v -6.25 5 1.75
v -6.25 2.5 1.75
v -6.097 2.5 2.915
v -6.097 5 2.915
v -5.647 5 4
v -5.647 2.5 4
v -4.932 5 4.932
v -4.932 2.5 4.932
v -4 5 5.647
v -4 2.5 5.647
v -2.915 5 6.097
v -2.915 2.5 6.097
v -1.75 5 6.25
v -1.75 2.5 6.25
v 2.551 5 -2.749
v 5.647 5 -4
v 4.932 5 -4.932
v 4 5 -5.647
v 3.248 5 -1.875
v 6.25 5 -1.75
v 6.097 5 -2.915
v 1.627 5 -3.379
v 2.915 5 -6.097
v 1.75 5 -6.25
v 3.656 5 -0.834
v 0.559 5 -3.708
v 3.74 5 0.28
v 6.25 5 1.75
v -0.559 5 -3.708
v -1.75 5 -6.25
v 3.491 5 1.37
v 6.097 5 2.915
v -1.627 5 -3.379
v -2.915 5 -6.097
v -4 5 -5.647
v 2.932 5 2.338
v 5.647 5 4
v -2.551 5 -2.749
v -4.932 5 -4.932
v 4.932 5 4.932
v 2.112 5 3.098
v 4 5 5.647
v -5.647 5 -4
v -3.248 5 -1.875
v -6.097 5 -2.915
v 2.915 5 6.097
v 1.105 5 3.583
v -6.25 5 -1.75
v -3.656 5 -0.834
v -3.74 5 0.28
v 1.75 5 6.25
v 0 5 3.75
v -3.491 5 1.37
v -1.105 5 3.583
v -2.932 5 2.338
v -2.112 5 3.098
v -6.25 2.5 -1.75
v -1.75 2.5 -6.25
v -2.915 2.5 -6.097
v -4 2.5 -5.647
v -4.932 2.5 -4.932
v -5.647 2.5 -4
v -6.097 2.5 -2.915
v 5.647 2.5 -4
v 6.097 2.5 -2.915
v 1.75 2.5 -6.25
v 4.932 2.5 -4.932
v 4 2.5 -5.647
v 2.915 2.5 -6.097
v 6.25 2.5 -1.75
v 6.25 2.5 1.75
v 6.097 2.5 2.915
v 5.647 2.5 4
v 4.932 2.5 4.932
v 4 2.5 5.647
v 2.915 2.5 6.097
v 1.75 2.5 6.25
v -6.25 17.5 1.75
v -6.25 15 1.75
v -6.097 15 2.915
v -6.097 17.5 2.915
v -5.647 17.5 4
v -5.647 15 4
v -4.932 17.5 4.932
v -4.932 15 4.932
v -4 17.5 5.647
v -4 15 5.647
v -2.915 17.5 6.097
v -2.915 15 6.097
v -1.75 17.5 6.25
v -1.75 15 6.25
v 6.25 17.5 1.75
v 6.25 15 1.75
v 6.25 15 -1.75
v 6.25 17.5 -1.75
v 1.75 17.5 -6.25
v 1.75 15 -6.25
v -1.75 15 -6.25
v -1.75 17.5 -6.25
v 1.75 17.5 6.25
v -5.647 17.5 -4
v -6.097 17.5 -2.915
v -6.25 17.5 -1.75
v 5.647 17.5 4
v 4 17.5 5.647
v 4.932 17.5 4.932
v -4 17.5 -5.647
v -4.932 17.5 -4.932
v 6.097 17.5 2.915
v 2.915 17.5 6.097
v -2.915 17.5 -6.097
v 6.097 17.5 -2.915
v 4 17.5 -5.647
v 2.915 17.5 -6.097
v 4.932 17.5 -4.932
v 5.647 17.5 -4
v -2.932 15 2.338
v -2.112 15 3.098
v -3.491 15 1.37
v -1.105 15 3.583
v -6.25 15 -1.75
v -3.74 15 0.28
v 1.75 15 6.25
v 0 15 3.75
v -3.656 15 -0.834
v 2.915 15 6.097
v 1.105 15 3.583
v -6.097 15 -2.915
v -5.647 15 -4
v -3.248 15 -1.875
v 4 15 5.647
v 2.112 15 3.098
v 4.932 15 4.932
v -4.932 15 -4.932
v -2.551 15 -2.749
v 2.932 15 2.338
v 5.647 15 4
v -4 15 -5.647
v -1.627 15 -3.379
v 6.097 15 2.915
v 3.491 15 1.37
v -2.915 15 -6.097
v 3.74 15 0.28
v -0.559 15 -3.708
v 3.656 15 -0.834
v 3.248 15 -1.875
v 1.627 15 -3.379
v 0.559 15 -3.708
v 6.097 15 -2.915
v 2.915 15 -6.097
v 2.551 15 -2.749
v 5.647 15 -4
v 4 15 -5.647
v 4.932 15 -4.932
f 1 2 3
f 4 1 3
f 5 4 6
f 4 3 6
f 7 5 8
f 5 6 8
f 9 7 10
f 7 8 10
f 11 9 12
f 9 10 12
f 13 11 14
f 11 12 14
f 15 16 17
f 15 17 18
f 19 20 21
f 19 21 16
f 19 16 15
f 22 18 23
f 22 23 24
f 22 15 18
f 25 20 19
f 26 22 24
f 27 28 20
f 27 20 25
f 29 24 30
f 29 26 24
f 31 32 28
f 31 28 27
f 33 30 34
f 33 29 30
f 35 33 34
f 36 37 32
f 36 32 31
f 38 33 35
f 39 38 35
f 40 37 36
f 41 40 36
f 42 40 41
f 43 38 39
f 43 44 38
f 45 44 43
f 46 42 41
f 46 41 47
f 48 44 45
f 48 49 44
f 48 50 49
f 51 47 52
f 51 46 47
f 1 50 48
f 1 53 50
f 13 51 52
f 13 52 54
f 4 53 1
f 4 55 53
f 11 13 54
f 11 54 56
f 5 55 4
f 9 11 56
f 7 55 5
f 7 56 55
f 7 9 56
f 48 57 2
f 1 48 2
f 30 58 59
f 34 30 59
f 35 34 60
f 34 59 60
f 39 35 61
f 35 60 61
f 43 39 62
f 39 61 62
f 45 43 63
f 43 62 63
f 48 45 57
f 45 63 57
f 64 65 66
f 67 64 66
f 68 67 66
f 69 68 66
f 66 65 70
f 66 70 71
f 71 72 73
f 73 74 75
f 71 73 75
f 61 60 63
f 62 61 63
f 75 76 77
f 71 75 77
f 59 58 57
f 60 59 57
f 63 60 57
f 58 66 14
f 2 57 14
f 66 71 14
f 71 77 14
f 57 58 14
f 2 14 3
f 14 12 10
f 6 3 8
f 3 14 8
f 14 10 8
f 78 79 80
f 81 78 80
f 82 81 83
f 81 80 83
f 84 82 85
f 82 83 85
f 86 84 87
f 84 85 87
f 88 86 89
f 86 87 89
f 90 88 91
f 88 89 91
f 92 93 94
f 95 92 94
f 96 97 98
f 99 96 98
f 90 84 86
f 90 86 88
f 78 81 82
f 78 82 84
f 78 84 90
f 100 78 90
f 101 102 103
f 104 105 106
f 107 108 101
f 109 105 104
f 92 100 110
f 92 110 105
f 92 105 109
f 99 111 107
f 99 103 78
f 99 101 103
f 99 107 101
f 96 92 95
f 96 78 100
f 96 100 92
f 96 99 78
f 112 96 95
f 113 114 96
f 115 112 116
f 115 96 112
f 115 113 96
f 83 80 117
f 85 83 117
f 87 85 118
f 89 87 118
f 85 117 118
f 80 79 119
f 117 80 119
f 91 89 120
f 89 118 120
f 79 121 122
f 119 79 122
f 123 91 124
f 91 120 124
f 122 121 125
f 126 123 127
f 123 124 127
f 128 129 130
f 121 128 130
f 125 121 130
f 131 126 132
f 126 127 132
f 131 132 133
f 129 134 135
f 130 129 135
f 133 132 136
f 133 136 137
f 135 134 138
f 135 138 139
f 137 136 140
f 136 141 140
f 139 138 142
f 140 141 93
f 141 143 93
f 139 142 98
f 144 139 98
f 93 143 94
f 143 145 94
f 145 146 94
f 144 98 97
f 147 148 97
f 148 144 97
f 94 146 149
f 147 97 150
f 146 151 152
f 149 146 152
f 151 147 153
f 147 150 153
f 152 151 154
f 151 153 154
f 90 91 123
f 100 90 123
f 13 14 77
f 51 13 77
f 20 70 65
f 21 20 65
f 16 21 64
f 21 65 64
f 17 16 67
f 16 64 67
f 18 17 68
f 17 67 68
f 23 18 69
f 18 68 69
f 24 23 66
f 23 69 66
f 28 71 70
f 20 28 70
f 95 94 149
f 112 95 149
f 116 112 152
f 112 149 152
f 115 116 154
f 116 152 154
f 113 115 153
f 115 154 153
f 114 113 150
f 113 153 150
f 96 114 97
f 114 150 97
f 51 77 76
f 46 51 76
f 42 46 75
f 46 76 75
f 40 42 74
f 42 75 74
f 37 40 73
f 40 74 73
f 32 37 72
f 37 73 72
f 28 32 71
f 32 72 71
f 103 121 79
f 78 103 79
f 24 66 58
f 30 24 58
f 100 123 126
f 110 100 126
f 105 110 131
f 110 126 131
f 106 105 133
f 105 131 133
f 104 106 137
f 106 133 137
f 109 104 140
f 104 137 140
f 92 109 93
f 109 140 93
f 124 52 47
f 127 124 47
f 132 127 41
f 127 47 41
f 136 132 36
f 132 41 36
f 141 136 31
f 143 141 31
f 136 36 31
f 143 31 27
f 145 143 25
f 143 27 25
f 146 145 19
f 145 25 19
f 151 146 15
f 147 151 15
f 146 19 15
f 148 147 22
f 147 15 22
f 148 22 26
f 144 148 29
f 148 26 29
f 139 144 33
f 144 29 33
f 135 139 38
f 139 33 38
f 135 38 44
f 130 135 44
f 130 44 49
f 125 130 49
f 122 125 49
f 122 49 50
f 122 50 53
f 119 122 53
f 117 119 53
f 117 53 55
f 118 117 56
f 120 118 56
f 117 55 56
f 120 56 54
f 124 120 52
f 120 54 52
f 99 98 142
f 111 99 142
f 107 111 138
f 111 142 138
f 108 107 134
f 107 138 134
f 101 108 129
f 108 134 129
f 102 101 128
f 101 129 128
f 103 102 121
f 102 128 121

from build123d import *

# Parameters (mm, degrees)
SKETCH1_R           = 7.5
BOSS_EXTRUDE1_DEPTH = 20
BOSS_EXTRUDE2_DEPTH = 5
BOSS_EXTRUDE4_START = 5
BOSS_EXTRUDE4_DEPTH = 5
SCALE1_SCALE        = 0.5


with BuildPart() as part:
    # Sketch1 → Boss-Extrude1 (new body)
    with BuildSketch(Plane(origin=(0, 0, 0), x_dir=(1, 0, 0), z_dir=(0, 1, 0))):
        with Locations(Location((0, 0, 0), (0, 0, 270))):
            Circle(SKETCH1_R)
    extrude(amount=BOSS_EXTRUDE1_DEPTH)

    # Sketch2 → Boss-Extrude2 (add)
    with BuildSketch(Plane(origin=(0, 20, 0), x_dir=(1, 0, 0), z_dir=(0, 1, 0))):
        with BuildLine():
            Line((-3.5, -12.5), (3.5, -12.5))
            ThreePointArc((3.5, -12.5), (9.863961031, -9.863961031), (12.5, -3.5))
            Line((12.5, -3.5), (12.5, 3.5))
            ThreePointArc((12.5, 3.5), (9.863961031, 9.863961031), (3.5, 12.5))
            Line((3.5, 12.5), (-3.5, 12.5))
            ThreePointArc((-3.5, 12.5), (-9.863961031, 9.863961031), (-12.5, 3.5))
            Line((-12.5, 3.5), (-12.5, -3.5))
            ThreePointArc((-12.5, -3.5), (-9.863961031, -9.863961031), (-3.5, -12.5))
        make_face()
    extrude(amount=BOSS_EXTRUDE2_DEPTH)

    # Sketch4 → Boss-Extrude4 (add)
    with BuildSketch(Plane.XZ.offset(BOSS_EXTRUDE4_START)):
        with BuildLine():
            Line((-3.5, 12.5), (3.5, 12.5))
            ThreePointArc((3.5, 12.5), (9.863961031, 9.863961031), (12.5, 3.5))
            Line((12.5, 3.5), (12.5, -3.5))
            ThreePointArc((12.5, -3.5), (9.863961031, -9.863961031), (3.5, -12.5))
            Line((3.5, -12.5), (-3.5, -12.5))
            ThreePointArc((-3.5, -12.5), (-9.863961031, -9.863961031), (-12.5, -3.5))
            Line((-12.5, -3.5), (-12.5, 3.5))
            ThreePointArc((-12.5, 3.5), (-9.863961031, 9.863961031), (-3.5, 12.5))
        make_face()
    extrude(amount=-BOSS_EXTRUDE4_DEPTH)


with BuildPart() as part_1:
    # Scale1: scaled about (0, 10, 0)
    add(part.part.scale(SCALE1_SCALE).moved(Location((0, 5, 0))))


solid = part_1.part
